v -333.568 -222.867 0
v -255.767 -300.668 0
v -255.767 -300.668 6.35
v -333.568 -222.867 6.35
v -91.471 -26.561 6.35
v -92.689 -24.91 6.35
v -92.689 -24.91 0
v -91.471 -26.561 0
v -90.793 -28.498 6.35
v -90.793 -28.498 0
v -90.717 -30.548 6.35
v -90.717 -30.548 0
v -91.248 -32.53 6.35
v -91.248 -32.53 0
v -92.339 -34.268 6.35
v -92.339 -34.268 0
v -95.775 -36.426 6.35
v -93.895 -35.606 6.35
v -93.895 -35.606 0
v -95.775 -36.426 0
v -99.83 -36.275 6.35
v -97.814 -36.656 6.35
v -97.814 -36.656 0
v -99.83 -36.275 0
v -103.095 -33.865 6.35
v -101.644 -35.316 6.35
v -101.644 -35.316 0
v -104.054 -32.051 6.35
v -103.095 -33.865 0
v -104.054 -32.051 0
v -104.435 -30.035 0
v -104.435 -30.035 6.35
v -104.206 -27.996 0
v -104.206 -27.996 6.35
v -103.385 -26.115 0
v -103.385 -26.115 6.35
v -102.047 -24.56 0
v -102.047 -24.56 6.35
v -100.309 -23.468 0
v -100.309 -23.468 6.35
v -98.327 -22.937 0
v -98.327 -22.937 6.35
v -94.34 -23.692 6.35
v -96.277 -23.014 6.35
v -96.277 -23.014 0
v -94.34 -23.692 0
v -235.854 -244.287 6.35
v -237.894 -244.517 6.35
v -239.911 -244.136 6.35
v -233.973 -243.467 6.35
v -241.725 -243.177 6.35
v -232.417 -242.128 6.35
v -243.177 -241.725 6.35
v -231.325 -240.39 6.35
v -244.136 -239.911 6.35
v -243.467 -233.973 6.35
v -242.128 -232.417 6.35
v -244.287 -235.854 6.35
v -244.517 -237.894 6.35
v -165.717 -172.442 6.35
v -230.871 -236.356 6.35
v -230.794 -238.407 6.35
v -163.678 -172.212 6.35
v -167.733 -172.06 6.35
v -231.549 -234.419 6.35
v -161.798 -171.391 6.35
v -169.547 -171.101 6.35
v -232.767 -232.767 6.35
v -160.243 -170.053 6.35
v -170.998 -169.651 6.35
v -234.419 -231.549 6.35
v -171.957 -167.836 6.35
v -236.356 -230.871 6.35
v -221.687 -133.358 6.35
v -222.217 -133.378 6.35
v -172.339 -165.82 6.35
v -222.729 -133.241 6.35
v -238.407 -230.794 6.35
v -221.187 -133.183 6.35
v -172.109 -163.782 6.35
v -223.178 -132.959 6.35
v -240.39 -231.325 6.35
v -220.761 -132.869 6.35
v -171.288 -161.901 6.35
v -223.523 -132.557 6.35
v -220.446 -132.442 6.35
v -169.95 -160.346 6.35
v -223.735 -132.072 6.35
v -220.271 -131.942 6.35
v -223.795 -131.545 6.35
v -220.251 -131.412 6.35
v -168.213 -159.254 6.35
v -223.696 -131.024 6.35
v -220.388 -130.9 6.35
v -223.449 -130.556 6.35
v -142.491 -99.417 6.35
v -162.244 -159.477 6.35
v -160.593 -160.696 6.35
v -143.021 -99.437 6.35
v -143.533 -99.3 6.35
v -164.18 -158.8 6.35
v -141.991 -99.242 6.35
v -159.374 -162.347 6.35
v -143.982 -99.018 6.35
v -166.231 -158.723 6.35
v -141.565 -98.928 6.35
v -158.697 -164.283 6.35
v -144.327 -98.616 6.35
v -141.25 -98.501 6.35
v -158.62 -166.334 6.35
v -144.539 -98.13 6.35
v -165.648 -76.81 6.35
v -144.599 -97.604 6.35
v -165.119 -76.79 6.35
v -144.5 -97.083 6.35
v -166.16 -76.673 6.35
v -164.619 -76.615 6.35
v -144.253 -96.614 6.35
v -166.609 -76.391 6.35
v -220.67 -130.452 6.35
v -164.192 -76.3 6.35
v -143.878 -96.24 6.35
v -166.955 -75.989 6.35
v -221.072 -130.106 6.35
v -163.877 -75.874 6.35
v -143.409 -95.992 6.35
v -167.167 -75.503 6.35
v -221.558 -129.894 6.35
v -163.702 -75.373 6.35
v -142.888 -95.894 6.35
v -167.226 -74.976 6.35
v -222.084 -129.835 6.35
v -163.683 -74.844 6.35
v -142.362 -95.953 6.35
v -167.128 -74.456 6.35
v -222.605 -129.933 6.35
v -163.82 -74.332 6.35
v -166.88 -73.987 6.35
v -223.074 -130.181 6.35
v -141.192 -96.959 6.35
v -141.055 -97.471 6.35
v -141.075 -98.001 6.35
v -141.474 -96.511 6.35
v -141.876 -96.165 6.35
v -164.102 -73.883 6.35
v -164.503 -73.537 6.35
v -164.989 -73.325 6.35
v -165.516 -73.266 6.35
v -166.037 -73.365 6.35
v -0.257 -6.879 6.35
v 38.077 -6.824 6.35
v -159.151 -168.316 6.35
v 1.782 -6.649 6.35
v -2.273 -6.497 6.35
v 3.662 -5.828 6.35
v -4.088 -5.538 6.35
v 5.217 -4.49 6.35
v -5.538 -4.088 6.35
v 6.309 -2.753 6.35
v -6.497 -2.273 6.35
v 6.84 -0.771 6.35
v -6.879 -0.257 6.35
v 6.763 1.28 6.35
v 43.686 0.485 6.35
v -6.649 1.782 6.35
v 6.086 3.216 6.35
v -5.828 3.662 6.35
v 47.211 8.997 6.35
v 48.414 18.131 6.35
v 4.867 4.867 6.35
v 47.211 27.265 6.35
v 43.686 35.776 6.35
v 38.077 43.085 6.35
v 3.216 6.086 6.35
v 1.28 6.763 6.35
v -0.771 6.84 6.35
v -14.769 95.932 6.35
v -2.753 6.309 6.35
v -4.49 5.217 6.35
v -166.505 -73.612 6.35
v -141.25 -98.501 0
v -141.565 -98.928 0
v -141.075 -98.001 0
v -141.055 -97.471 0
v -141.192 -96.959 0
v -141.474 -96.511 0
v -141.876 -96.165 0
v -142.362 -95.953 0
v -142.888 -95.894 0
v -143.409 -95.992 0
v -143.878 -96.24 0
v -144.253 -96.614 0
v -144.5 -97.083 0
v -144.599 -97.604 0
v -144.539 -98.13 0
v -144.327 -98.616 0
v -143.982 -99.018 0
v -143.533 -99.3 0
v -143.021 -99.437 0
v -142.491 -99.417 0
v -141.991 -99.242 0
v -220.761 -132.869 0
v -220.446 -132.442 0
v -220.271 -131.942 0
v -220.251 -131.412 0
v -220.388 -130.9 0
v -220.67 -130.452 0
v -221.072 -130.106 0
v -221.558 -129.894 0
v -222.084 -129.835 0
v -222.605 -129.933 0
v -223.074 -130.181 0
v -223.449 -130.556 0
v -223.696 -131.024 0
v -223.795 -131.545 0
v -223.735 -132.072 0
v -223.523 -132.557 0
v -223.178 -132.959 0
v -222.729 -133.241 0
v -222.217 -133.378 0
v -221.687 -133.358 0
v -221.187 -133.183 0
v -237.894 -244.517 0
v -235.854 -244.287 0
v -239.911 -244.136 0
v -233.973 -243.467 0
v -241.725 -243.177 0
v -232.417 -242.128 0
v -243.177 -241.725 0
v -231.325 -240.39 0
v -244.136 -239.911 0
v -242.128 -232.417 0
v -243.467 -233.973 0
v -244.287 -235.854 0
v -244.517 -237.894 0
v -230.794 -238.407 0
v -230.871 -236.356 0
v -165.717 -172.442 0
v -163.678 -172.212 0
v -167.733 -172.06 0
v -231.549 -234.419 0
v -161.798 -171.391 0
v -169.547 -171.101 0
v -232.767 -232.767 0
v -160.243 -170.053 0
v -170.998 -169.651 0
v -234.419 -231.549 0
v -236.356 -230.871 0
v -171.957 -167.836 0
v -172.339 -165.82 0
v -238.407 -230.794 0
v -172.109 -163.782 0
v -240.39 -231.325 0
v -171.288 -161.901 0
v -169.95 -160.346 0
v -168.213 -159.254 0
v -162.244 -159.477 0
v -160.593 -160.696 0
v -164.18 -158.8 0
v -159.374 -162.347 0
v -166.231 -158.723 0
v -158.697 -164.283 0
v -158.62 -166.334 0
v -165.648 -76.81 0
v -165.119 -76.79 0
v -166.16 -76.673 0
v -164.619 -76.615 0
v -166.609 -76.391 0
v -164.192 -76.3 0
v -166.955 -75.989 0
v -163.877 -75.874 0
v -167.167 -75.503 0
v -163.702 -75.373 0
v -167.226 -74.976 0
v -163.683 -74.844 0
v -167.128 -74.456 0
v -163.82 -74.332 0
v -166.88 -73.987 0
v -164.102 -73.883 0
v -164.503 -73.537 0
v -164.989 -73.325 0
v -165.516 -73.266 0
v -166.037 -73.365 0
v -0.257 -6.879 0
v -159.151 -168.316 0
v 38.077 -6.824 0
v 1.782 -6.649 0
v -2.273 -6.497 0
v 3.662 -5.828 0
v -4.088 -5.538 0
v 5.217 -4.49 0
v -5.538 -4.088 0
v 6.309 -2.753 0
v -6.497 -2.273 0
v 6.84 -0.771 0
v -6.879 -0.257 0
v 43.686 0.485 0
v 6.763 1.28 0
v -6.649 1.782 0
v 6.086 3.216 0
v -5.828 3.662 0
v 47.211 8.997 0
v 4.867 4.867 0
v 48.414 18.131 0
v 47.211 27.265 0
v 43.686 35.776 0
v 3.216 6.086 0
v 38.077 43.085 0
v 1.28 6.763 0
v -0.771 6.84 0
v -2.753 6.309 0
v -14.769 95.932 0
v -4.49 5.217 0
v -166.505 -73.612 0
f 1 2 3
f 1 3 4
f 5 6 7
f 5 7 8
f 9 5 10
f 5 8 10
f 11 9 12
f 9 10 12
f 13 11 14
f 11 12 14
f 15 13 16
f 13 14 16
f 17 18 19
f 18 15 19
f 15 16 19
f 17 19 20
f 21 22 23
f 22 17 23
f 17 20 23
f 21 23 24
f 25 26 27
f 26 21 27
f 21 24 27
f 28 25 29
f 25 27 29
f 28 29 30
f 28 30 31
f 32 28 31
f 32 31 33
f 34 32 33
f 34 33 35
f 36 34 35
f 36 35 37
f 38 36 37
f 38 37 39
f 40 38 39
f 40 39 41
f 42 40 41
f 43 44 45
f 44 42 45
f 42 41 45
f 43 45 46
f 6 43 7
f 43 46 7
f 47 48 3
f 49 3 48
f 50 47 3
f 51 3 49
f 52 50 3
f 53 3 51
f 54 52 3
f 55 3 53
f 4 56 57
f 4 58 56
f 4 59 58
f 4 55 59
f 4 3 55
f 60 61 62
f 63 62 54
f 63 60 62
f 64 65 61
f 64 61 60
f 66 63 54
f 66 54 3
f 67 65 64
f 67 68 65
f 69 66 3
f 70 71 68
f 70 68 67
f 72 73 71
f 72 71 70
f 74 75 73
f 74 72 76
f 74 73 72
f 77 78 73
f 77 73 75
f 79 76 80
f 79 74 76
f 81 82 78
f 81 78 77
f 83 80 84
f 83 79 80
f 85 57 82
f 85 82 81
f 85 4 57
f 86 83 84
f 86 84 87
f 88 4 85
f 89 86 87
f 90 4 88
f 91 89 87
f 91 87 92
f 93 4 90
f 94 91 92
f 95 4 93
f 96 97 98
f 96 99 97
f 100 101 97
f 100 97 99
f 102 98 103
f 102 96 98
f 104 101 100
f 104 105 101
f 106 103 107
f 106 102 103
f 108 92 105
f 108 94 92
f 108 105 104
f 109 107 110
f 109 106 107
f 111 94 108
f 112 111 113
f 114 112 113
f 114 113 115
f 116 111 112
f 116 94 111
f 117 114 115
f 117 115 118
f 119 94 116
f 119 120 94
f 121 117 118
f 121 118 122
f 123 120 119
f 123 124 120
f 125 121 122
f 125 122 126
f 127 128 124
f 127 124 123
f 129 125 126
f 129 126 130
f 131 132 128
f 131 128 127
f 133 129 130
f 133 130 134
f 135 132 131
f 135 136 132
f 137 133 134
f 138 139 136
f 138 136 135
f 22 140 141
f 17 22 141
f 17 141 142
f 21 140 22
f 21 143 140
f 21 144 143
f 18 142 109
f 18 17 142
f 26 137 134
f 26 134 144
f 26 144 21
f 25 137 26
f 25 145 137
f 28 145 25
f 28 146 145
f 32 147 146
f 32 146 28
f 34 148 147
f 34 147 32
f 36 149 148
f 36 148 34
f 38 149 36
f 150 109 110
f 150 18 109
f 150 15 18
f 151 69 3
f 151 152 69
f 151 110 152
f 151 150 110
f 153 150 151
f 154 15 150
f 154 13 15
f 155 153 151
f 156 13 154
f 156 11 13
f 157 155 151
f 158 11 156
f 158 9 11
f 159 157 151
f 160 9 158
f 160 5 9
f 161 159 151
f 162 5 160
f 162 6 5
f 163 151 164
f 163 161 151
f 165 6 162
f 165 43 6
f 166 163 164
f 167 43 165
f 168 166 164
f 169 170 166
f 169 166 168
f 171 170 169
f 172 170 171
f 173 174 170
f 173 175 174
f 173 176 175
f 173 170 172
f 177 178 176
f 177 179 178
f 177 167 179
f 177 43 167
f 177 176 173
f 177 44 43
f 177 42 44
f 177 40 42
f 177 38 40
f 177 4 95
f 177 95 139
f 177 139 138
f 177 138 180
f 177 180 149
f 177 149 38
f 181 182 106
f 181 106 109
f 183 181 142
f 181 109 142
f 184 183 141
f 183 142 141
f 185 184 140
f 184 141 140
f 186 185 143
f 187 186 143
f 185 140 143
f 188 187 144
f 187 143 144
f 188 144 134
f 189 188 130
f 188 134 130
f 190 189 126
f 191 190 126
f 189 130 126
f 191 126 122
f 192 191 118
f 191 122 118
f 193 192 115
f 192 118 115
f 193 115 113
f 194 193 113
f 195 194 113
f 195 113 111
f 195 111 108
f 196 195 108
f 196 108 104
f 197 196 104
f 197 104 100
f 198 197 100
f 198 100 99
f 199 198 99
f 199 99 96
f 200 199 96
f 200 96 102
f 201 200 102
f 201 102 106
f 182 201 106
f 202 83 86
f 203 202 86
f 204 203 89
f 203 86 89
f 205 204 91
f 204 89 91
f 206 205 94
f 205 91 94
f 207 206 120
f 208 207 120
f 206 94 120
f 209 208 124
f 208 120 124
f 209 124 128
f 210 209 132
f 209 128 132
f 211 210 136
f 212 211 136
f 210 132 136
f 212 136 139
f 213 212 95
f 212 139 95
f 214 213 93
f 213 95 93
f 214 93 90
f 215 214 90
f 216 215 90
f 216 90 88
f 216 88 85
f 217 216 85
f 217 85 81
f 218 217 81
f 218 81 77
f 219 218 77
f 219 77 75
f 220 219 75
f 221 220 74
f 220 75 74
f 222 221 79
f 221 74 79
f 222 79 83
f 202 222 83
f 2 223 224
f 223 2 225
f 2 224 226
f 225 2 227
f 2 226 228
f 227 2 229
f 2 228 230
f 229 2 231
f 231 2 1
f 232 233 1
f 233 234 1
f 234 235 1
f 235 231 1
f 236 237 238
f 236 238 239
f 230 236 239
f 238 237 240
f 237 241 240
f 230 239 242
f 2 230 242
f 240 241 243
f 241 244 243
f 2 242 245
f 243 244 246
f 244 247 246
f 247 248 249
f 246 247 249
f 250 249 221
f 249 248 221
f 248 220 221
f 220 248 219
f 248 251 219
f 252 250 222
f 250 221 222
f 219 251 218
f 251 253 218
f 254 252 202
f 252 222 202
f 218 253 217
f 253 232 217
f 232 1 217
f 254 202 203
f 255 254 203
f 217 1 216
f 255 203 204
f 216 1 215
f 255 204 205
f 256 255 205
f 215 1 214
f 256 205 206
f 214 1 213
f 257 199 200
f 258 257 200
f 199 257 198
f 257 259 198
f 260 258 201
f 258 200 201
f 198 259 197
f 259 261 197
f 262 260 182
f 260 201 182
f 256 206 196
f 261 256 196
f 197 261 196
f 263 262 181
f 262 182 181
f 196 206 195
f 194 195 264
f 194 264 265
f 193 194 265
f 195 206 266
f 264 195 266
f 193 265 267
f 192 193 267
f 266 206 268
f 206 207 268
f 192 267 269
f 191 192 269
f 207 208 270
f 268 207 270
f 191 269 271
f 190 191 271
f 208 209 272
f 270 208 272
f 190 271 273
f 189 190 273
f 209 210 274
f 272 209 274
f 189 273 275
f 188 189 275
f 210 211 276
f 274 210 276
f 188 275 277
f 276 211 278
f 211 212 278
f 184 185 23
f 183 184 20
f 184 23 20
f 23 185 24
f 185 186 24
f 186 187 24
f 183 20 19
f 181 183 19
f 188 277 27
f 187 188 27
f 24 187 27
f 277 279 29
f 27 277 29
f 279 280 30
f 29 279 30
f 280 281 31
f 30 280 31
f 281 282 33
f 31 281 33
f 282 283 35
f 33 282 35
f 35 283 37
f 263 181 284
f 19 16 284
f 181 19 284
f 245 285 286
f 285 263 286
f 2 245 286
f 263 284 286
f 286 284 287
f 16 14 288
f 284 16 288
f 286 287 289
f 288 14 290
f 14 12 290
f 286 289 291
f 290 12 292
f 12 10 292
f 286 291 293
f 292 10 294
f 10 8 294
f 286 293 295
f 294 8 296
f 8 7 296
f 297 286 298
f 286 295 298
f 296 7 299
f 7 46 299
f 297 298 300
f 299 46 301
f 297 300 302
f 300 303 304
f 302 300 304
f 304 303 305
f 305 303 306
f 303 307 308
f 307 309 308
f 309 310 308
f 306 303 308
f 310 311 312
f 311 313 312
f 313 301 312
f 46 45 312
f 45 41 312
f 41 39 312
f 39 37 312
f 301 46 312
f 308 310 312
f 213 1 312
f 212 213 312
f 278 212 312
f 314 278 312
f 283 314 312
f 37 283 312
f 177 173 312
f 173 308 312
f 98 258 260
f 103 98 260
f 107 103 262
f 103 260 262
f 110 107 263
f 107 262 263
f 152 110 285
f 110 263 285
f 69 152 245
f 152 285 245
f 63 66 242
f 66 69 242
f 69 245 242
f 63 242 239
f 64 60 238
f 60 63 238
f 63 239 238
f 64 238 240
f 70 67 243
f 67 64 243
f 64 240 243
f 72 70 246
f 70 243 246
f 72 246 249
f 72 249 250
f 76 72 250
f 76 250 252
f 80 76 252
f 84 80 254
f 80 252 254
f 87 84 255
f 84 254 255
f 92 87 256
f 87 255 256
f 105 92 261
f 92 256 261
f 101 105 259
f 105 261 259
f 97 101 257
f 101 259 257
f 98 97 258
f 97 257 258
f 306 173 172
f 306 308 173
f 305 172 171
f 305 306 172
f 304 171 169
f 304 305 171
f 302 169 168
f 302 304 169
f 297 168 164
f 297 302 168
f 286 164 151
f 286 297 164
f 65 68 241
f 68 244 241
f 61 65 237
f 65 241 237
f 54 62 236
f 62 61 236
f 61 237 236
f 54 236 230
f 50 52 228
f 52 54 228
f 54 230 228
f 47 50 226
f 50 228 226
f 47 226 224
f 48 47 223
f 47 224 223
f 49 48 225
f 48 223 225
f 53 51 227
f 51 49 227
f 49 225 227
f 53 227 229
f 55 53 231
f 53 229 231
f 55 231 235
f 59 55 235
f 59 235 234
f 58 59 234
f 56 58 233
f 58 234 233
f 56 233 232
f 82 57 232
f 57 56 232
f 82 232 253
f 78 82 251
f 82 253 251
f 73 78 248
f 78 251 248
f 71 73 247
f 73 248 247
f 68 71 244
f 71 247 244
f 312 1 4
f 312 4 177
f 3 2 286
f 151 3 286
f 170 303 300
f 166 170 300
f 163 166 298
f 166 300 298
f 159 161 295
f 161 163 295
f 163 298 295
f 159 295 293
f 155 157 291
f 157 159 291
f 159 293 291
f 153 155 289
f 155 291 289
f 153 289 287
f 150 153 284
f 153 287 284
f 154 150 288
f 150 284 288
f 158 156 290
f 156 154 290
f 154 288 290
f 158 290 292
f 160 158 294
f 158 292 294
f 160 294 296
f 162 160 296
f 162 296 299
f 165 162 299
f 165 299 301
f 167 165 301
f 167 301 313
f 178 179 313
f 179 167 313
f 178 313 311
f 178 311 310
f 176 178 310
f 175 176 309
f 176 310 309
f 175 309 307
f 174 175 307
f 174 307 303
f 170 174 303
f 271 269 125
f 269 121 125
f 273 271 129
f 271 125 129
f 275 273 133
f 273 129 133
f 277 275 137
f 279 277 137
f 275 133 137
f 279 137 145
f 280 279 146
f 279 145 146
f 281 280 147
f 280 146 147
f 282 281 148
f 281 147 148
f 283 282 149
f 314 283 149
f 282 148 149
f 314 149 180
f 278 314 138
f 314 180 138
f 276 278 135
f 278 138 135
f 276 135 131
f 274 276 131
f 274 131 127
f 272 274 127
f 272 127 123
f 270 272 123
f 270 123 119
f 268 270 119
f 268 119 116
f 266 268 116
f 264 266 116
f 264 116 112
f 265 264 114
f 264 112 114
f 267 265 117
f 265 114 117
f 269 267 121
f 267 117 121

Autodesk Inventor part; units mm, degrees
ref_plane "YZ Plane" through (0, 0, 0) normal (1, 0, 0) x (0, 1, 0)
ref_plane "XZ Plane" through (0, 0, 0) normal (0, 1, 0) x (-1, 0, 0)
ref_plane "XY Plane" through (0, 0, 0) normal (0, 0, 1) x (1, 0, 0)
ref_plane "Work Plane1" through (-237.6364, -237.6364, 0) normal (0, 0, 1) x (0.7071, 0.7071, 0)
sketch "Sketch1" plane through (-237.6364, -237.6364, 0) normal (0, 0, 1) x (0.7071, 0.7071, 0)
  circle A0 centre (0, 0) radius 4.15 construction
  circle A1 centre (336.0686, 0) radius 6.45 construction
  circle A2 centre (246.0297, 47.9271) radius 4.83 construction
  circle A3 centre (102, -0.0729) radius 4.83 construction
  circle A4 centre (0, 0) radius 6.8857
  circle A5 centre (336.0686, 0) radius 6.8834
  circle A6 centre (102, -0.0729) radius 6.8834
  circle A7 centre (246.0297, 47.9271) radius 6.8834
  line L0 (78.0149, 71.9271) -> (270.0149, 71.9271) construction
  line L1 (168.0343, 78.2771) -> (168.0343, 71.9271)
  line L2 (168.0343, 78.2771) -> (393.4593, 78.2771)
  line L3 (168.0343, 78.2771) -> (-57.3907, 78.2771)
  line L4 (-57.3907, -31.75) -> (-57.3907, 78.2771)
  line L5 (-57.3907, -31.75) -> (358.1679, -31.75)
  line L6 (393.4593, 3.5414) -> (393.4593, 78.2771)
  arc A8 (358.1679, -31.75) -> (393.4593, 3.5414) centre (358.1679, 3.5414) ccw
  point P0 (336.0686, 0)
  dimension "d0" = 13.7714
  dimension "d1" = 13.7668
  dimension "d2" = 13.7668
  dimension "d3" = 13.7668
  dimension "d6" = 225.425
  dimension "d7" = 225.425
extrude "Extrusion1" add sketch "Sketch1" along normal blind 6.35
sketch "Sketch3" plane through (-237.6364, -237.6364, 6.35) normal (0, 0, 1) x (0.7071, -0.7071, 0)
  circle A0 centre (-63.9271, 166.0149) radius 3.81 construction
  circle A1 centre (-31.9271, 166.0149) radius 3.81 construction
  circle A2 centre (-15.9271, 166.0149) radius 3.81 construction
  circle A3 centre (-63.9271, 86.0149) radius 3.81 construction
  circle A4 centre (16.0729, 166.0149) radius 3.81 construction
  circle A5 centre (-31.9271, 166.0149) radius 3.81 construction
  circle A6 centre (-63.9271, 86.0149) radius 5.08 construction
  circle A7 centre (-31.9271, 86.0149) radius 3.81 construction
  circle A8 centre (-15.9271, 86.0149) radius 3.81 construction
  circle A9 centre (16.0729, 86.0149) radius 3.81 construction
  circle A10 centre (-63.9271, 86.0149) radius 1.778
  circle A11 centre (-31.9271, 166.0149) radius 1.778
  circle A12 centre (-63.9271, 166.0149) radius 1.778
  circle A13 centre (16.0729, 166.0149) radius 1.9304 construction
  circle A14 centre (16.0729, 246.0149) radius 1.9304 construction
  circle A15 centre (-15.9271, 166.0149) radius 1.9304 construction
  circle A16 centre (16.0729, 246.0149) radius 1.778
  point P0 (0, 336.0686)
  dimension "d11" = 3.556
  dimension "d17" = 3.556
  dimension "d18" = 3.556
  dimension "d21" = 3.556
extrude "Extrusion2" cut sketch "Sketch3" against normal through all contours A10 | A11 | A12
properties part number "new sidewall outside"
